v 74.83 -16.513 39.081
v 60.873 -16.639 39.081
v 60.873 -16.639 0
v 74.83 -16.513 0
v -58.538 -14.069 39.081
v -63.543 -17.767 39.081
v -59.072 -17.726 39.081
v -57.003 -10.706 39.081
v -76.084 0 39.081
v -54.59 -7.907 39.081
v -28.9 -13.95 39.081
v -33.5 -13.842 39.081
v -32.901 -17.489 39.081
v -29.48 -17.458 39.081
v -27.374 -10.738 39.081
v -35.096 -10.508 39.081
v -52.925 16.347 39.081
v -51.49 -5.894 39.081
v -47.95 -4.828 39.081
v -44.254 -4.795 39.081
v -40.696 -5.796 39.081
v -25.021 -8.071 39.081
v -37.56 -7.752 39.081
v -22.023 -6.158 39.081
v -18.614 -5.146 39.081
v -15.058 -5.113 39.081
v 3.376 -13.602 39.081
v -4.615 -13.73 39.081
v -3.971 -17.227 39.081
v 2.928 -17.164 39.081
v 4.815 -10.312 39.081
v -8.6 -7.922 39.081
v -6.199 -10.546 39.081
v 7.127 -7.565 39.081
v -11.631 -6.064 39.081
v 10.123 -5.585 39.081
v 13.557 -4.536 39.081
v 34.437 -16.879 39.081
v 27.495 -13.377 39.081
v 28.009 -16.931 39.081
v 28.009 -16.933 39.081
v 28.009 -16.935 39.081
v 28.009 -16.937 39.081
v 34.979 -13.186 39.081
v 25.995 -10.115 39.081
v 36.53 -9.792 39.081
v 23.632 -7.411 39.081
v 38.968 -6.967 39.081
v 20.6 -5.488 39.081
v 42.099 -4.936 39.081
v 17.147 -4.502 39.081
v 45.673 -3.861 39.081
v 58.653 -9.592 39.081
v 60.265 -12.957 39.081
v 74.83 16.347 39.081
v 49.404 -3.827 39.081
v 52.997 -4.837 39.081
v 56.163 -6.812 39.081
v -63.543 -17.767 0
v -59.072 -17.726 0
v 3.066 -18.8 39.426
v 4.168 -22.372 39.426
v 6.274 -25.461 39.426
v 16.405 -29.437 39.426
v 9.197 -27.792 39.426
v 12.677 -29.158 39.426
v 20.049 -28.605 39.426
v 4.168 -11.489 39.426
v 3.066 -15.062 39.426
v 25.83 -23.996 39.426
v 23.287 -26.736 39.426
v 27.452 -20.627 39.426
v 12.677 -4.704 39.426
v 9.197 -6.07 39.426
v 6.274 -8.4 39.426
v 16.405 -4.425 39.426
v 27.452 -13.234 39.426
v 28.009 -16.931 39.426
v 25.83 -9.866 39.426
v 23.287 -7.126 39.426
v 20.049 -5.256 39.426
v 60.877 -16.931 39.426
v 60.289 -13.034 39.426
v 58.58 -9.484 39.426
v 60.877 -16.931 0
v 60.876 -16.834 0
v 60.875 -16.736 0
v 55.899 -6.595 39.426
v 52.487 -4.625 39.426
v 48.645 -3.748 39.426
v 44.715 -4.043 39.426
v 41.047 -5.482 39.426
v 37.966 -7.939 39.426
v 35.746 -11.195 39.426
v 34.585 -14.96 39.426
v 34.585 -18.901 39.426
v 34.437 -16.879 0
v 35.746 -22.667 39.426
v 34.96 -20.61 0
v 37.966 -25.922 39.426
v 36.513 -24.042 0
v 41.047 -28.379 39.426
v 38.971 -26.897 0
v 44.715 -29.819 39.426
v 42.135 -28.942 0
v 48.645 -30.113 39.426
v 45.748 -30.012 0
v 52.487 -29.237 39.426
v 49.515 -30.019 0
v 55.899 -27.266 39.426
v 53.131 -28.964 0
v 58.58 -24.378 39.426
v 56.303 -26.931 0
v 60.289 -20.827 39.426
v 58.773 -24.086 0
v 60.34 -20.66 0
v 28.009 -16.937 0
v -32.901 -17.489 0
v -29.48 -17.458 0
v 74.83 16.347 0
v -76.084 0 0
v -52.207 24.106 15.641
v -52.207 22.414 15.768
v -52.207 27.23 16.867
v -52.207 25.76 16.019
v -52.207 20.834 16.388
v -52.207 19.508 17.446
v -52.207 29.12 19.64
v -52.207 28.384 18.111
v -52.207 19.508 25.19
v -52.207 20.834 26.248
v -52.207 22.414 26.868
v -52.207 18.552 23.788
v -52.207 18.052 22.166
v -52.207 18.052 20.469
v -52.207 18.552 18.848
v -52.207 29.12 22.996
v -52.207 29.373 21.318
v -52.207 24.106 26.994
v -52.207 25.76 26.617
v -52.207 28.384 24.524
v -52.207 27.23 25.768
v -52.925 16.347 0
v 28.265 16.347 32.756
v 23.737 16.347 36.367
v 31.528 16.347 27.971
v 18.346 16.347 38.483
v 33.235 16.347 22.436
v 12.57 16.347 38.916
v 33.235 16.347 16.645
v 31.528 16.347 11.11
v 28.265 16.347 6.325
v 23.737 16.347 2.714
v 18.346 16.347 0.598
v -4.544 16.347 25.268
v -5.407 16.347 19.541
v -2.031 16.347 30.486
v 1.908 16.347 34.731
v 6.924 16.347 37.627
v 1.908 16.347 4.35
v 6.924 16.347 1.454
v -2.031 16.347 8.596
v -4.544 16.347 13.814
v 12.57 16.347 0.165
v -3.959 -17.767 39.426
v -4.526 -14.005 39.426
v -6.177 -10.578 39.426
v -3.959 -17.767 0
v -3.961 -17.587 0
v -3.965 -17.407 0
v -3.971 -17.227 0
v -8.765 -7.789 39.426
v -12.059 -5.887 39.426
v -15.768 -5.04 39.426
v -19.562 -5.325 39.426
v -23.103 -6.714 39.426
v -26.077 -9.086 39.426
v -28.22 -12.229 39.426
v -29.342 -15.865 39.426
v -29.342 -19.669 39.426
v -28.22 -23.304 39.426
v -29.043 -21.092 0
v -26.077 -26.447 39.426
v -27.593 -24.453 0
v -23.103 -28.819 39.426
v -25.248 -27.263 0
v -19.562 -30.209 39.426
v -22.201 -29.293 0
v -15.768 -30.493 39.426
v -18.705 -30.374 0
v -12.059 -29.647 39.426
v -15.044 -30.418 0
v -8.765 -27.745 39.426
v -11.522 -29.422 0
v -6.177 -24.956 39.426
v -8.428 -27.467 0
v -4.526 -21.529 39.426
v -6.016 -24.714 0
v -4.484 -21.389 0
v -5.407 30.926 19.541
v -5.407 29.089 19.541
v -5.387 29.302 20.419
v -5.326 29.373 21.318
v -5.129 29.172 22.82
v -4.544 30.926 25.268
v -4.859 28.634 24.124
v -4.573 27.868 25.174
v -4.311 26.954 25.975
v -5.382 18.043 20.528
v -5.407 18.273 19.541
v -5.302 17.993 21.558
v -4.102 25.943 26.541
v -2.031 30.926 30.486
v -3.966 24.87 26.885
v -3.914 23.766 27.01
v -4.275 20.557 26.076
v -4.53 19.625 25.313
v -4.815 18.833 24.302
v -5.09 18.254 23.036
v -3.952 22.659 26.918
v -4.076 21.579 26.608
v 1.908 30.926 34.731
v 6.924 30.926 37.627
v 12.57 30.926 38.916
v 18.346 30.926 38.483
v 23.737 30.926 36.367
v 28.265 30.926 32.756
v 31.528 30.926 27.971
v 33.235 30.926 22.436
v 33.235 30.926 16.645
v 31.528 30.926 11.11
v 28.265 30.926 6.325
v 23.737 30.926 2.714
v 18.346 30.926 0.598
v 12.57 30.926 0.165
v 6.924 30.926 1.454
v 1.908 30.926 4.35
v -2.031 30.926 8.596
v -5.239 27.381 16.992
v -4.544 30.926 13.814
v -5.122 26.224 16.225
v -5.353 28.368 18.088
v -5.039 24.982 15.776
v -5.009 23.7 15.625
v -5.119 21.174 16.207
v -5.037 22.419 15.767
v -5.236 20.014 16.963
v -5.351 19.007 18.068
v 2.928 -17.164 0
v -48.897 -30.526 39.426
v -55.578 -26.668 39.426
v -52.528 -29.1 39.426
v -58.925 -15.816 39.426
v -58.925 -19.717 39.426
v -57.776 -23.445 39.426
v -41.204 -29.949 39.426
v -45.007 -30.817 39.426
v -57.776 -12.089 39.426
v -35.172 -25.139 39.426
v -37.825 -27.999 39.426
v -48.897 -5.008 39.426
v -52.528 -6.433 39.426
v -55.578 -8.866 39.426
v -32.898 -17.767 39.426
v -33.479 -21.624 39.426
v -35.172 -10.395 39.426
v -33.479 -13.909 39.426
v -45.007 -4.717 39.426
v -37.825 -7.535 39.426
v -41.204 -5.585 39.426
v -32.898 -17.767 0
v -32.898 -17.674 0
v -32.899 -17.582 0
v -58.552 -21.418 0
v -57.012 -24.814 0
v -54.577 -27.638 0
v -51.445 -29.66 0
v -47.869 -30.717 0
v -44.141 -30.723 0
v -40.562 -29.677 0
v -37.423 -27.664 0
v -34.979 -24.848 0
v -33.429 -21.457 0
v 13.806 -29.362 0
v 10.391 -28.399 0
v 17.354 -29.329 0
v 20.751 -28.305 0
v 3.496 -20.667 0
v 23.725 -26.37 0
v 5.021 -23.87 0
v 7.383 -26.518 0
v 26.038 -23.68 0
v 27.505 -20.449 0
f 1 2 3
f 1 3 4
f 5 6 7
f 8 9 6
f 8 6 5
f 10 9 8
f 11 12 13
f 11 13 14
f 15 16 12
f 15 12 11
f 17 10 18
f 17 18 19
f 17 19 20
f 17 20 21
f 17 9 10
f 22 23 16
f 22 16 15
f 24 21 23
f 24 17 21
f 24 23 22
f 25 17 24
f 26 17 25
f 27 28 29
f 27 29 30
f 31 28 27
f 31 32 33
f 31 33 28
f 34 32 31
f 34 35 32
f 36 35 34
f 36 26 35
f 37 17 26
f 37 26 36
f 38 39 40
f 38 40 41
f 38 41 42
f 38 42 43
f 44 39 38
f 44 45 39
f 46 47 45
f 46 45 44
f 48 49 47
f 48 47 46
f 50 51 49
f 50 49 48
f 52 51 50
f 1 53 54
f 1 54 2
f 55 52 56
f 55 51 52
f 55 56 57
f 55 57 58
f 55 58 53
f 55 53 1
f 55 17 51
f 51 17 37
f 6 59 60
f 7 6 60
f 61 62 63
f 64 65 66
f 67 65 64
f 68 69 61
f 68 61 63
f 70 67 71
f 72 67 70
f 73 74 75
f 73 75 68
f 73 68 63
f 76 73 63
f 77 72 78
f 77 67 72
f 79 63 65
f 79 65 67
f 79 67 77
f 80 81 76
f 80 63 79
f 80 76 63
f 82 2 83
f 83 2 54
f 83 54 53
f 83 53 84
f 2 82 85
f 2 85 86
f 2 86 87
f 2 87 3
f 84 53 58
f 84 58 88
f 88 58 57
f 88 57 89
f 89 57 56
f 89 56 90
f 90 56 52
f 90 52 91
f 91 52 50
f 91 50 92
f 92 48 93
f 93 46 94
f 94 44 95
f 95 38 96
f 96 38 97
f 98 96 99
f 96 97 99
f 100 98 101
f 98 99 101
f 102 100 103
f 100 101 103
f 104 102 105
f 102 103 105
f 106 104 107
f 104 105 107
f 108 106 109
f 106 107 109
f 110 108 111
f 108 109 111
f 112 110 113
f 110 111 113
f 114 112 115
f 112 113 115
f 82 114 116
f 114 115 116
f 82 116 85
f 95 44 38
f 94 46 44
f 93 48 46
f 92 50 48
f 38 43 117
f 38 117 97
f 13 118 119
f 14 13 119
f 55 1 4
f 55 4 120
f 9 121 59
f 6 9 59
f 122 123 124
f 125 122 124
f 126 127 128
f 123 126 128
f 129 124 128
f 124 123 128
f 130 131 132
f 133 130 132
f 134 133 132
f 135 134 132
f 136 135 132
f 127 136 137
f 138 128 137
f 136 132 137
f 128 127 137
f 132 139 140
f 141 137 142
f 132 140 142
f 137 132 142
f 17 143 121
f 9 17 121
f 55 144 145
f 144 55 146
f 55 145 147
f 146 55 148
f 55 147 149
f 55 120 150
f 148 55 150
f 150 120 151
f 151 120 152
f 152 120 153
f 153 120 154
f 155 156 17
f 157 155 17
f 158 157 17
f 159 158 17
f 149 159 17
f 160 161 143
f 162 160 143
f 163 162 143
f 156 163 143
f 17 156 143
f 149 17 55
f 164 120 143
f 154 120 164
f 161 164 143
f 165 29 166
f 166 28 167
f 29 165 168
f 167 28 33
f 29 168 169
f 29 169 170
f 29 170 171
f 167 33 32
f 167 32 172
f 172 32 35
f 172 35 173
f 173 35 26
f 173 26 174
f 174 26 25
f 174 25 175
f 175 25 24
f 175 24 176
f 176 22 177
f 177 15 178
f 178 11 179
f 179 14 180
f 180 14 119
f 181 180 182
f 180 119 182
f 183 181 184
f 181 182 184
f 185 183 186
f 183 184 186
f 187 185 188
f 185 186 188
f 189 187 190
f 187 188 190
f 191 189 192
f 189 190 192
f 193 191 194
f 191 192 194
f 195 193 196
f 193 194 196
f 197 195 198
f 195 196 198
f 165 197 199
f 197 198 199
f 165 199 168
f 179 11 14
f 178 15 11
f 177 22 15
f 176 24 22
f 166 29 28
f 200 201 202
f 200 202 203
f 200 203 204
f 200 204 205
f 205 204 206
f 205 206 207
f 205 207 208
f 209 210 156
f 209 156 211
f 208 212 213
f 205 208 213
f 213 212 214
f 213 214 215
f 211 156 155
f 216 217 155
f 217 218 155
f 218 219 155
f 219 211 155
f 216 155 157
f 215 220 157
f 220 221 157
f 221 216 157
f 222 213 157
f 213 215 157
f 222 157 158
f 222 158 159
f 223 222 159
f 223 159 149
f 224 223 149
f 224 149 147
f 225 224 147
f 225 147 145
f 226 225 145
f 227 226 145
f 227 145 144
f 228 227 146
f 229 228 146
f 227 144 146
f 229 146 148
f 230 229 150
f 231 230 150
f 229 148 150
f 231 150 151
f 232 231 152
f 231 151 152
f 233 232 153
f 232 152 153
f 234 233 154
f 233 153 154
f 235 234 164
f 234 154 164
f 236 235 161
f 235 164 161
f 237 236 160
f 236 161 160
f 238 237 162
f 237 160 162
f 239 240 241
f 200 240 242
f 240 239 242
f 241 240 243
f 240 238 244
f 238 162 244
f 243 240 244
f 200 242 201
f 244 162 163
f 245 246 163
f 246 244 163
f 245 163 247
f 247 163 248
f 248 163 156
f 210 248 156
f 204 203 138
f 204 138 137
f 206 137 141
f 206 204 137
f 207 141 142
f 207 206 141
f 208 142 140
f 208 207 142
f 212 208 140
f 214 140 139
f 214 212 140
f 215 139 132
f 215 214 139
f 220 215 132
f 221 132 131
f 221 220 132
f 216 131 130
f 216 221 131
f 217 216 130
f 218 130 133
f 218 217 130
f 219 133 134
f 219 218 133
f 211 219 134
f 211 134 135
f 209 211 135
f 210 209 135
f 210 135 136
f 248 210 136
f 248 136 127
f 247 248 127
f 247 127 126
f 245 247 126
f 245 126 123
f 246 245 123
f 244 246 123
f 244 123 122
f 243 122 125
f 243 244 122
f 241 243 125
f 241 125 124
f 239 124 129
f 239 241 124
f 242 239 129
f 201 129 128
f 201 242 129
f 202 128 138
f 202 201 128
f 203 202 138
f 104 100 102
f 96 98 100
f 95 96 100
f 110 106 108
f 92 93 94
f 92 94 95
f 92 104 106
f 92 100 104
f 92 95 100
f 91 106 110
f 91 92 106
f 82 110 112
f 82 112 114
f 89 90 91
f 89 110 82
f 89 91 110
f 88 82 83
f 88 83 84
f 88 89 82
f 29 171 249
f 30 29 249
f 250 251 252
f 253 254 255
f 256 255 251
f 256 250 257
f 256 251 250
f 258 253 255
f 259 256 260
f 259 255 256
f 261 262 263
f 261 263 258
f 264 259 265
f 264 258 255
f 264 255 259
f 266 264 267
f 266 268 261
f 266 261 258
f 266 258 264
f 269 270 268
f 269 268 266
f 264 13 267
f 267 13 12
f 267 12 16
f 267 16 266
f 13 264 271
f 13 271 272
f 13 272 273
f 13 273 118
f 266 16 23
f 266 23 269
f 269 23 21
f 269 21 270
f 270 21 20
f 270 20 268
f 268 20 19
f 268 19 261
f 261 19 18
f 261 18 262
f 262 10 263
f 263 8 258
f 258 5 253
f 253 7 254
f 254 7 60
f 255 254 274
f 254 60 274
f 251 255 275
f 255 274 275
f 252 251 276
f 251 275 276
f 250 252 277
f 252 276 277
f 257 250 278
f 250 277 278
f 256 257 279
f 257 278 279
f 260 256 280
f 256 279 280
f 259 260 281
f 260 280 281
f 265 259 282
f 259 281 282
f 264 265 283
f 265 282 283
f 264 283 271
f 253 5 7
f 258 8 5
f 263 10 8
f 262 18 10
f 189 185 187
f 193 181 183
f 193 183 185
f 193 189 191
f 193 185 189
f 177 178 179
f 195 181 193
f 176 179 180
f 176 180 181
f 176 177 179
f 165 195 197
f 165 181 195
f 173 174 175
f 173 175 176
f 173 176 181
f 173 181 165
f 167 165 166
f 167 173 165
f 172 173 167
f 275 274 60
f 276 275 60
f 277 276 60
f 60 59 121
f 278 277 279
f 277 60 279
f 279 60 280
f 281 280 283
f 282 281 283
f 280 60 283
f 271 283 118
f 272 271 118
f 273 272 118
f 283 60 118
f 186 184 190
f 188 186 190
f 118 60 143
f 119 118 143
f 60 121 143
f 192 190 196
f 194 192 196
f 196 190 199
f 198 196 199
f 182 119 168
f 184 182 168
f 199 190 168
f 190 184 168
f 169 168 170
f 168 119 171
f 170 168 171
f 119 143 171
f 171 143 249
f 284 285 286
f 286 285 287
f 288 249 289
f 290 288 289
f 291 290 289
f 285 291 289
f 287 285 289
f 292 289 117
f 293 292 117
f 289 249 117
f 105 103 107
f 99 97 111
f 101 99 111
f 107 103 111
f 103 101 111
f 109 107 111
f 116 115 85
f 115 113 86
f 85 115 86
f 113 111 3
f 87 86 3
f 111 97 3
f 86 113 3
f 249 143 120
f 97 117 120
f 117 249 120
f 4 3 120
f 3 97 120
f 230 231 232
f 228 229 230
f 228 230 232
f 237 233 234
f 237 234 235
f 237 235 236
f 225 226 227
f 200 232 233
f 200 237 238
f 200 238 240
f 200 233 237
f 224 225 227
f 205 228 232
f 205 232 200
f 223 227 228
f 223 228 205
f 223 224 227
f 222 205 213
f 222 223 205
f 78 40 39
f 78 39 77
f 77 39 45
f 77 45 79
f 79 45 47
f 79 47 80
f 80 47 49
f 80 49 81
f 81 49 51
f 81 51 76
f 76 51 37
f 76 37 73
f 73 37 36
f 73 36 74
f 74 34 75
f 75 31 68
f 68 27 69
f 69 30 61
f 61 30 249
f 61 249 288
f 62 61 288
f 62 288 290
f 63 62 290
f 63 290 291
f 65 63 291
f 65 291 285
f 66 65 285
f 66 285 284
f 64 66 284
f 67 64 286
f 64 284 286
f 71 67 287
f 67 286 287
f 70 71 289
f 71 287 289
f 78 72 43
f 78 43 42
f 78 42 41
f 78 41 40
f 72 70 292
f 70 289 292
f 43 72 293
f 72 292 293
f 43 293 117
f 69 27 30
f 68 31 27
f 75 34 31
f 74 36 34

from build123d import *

# Parameters (mm, degrees)
F1_DEPTH = 39.081264
F2_R     = 13.086834
F2_R_2   = 12.762308
F2_R_3   = 12.541297
F2_R_4   = 13.219685
F3_DEPTH = 39.425768
F4_R     = 19.429487
F5_DEPTH = 14.579227
F6_R     = 5.692601
F7_DEPTH = 52.206531


with BuildPart() as f1:
    # F0 (on Top) → F1 (new body)
    with BuildSketch(Plane.XY):
        Polygon((-52.925434, 16.347141), (-76.083884, 0), (-63.54259, -17.766833), (74.829757, -16.512707), (74.829757, 16.347141), align=None)
    extrude(amount=F1_DEPTH)

    # F2 (on Top) → F3 (join)
    with BuildSketch(Plane.XY):
        with Locations((-45.984775, -17.766833)):
            Circle(F2_R)
        with Locations((-16.72174, -17.766833)):
            Circle(F2_R_2)
        with Locations((15.467599, -16.930744)):
            Circle(F2_R_3)
        with Locations((47.656953, -16.930744)):
            Circle(F2_R_4)
    extrude(amount=F3_DEPTH)

    # F4 (on face) → F5 (join)
    with BuildSketch(Plane(origin=(0, 16.347141, 0), x_dir=(-1, 0, 0), z_dir=(0, 1, 0))):
        with Locations((-14.022259, 19.540632)):
            Circle(F4_R)
    extrude(amount=F5_DEPTH)

    # F6 (on Right) → F7 (join)
    with BuildSketch(Plane.YZ):
        with Locations((23.680674, 21.317706)):
            Circle(F6_R)
    extrude(amount=-F7_DEPTH)


solid = f1.part
